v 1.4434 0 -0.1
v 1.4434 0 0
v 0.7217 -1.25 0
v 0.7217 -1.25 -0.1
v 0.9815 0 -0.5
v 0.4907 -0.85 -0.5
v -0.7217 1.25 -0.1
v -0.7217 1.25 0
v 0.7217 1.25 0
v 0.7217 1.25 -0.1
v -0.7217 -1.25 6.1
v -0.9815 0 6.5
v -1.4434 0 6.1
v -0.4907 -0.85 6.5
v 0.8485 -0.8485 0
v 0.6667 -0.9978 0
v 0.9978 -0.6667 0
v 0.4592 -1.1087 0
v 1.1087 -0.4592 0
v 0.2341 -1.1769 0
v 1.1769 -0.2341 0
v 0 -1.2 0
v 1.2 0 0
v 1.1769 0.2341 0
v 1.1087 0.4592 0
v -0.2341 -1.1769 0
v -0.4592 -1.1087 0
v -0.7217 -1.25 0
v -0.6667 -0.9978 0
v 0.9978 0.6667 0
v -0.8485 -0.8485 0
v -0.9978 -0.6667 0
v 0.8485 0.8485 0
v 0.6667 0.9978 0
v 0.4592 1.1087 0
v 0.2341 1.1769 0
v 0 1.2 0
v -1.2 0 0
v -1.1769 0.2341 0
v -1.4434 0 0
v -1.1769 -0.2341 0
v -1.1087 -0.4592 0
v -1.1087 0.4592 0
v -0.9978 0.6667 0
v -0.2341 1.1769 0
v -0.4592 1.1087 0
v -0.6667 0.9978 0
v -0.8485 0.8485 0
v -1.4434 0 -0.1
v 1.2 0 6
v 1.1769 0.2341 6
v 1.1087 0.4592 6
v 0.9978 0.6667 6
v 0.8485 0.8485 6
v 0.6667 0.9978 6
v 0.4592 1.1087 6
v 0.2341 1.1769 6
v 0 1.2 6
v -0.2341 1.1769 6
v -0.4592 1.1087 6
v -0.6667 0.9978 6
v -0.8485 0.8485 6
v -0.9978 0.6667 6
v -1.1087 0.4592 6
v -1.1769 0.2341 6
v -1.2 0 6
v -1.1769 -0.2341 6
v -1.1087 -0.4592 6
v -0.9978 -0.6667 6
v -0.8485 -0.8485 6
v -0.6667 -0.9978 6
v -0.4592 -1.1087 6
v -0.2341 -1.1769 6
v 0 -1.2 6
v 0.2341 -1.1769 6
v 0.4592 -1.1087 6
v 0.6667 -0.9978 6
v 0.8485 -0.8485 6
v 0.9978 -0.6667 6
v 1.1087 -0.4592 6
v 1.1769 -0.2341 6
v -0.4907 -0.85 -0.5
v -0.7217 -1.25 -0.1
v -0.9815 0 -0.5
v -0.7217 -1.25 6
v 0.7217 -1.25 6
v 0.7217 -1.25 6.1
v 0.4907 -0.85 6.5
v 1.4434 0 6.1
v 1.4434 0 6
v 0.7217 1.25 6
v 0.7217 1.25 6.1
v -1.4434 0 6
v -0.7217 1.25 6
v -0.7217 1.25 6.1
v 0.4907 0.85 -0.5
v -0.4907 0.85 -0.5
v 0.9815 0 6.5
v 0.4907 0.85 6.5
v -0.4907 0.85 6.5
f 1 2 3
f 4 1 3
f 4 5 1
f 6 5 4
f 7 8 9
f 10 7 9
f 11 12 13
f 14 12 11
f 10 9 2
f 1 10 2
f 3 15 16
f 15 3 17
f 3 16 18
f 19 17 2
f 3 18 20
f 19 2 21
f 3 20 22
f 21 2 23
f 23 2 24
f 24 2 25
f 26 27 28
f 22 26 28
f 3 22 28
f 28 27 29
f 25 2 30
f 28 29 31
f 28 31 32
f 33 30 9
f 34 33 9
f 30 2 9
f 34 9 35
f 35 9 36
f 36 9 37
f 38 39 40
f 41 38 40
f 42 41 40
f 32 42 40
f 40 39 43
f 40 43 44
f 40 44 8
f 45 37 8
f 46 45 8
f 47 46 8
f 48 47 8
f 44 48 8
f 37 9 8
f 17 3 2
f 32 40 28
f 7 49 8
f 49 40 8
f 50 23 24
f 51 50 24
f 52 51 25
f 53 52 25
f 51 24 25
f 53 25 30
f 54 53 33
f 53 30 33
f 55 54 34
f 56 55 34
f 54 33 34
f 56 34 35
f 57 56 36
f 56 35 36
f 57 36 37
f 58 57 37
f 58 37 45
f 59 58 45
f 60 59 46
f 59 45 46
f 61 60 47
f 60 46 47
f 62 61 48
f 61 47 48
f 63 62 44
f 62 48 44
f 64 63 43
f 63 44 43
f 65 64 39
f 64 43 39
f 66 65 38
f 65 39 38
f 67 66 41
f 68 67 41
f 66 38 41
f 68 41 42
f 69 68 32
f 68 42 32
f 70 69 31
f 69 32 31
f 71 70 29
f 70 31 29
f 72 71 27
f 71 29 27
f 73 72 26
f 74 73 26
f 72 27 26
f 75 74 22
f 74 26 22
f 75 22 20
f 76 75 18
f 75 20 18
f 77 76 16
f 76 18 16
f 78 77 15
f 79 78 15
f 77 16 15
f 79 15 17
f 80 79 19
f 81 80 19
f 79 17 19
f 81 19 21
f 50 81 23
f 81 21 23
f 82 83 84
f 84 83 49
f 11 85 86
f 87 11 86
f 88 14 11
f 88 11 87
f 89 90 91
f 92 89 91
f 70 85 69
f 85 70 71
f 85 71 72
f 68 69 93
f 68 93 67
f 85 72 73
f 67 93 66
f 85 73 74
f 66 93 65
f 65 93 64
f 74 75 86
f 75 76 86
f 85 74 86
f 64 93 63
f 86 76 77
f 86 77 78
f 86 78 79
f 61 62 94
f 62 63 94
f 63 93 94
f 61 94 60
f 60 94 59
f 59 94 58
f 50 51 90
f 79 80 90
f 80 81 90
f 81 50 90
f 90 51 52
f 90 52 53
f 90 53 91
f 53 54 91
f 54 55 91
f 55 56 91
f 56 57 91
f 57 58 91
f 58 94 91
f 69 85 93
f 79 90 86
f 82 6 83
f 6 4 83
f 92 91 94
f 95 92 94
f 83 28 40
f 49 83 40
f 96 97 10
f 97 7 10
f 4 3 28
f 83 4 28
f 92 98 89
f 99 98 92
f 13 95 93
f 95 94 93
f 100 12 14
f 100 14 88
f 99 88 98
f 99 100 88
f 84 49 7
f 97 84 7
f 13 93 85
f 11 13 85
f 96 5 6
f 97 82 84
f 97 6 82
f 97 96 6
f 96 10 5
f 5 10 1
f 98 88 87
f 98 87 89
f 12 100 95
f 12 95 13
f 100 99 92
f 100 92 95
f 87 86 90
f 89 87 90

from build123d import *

# Parameters (mm, degrees)
CROQUIS1_R              = 1.2
SALIENTE_EXTRUIR1_DEPTH = 6
SALIENTE_EXTRUIR2_DEPTH = 0.5
SALIENTE_EXTRUIR3_DEPTH = 0.5
CHAFL_N1_SIZE           = 0.4
CHAFL_N2_SIZE           = 0.4
CHAFL_N3_SIZE           = 0.4
CHAFL_N4_SIZE           = 0.4
CHAFL_N5_SIZE           = 0.4
CHAFL_N6_SIZE           = 0.4
CHAFL_N7_SIZE           = 0.4
CHAFL_N8_SIZE           = 0.4
CHAFL_N9_SIZE           = 0.4
CHAFL_N10_SIZE          = 0.4
CHAFL_N11_SIZE          = 0.4
CHAFL_N12_SIZE          = 0.4


with BuildPart() as part:
    # Croquis1 → Saliente-Extruir1 (new body)
    with BuildSketch(Plane.XY):
        Circle(CROQUIS1_R)
    extrude(amount=SALIENTE_EXTRUIR1_DEPTH)

    # Croquis2 → Saliente-Extruir2 (add)
    with BuildSketch(Plane.XY.offset(6)):
        Polygon((1.443375673, 0), (0.721687836, 1.25), (-0.721687836, 1.25), (-1.443375673, 0), (-0.721687836, -1.25), (0.721687836, -1.25), align=None)
    extrude(amount=SALIENTE_EXTRUIR2_DEPTH)

    # Croquis3 → Saliente-Extruir3 (add)
    with BuildSketch(Plane(origin=(0, 0, 0), x_dir=(-1, 0, 0), z_dir=(0, 0, -1))):
        Polygon((1.443375673, 0), (0.721687836, 1.25), (-0.721687836, 1.25), (-1.443375673, 0), (-0.721687836, -1.25), (0.721687836, -1.25), align=None)
    extrude(amount=SALIENTE_EXTRUIR3_DEPTH)

    # Chaflán1
    chafl_n1_edges = [part.edges().sort_by_distance(p)[0] for p in [
        (0, 1.25, 6.5),
    ]]
    chamfer(chafl_n1_edges, length=CHAFL_N1_SIZE)

    # Chaflán2
    chafl_n2_edges = [part.edges().sort_by_distance(p)[0] for p in [
        (1.198001809, 0.425, 6.5),
    ]]
    chamfer(chafl_n2_edges, length=CHAFL_N2_SIZE)

    # Chaflán3
    chafl_n3_edges = [part.edges().sort_by_distance(p)[0] for p in [
        (0.967061701, -0.825, 6.5),
    ]]
    chamfer(chafl_n3_edges, length=CHAFL_N3_SIZE)

    # Chaflán4
    chafl_n4_edges = [part.edges().sort_by_distance(p)[0] for p in [
        (-0.230940108, -1.25, 6.5),
    ]]
    chamfer(chafl_n4_edges, length=CHAFL_N4_SIZE)

    # Chaflán5
    chafl_n5_edges = [part.edges().sort_by_distance(p)[0] for p in [
        (-1.198001809, -0.425, 6.5),
    ]]
    chamfer(chafl_n5_edges, length=CHAFL_N5_SIZE)

    # Chaflán6
    chafl_n6_edges = [part.edges().sort_by_distance(p)[0] for p in [
        (-1.082531755, 0.625, 6.5),
    ]]
    chamfer(chafl_n6_edges, length=CHAFL_N6_SIZE)

    # Chaflán7
    chafl_n7_edges = [part.edges().sort_by_distance(p)[0] for p in [
        (1.082531755, -0.625, -0.5),
    ]]
    chamfer(chafl_n7_edges, length=CHAFL_N7_SIZE)

    # Chaflán8
    chafl_n8_edges = [part.edges().sort_by_distance(p)[0] for p in [
        (0.967061701, 0.825, -0.5),
    ]]
    chamfer(chafl_n8_edges, length=CHAFL_N8_SIZE)

    # Chaflán9
    chafl_n9_edges = [part.edges().sort_by_distance(p)[0] for p in [
        (-0.230940108, 1.25, -0.5),
    ]]
    chamfer(chafl_n9_edges, length=CHAFL_N9_SIZE)

    # Chaflán10
    chafl_n10_edges = [part.edges().sort_by_distance(p)[0] for p in [
        (-0.230940108, -1.25, -0.5),
    ]]
    chamfer(chafl_n10_edges, length=CHAFL_N10_SIZE)

    # Chaflán11
    chafl_n11_edges = [part.edges().sort_by_distance(p)[0] for p in [
        (-1.198001809, -0.425, -0.5),
    ]]
    chamfer(chafl_n11_edges, length=CHAFL_N11_SIZE)

    # Chaflán12
    chafl_n12_edges = [part.edges().sort_by_distance(p)[0] for p in [
        (-1.082531755, 0.625, -0.5),
    ]]
    chamfer(chafl_n12_edges, length=CHAFL_N12_SIZE)


solid = part.part
